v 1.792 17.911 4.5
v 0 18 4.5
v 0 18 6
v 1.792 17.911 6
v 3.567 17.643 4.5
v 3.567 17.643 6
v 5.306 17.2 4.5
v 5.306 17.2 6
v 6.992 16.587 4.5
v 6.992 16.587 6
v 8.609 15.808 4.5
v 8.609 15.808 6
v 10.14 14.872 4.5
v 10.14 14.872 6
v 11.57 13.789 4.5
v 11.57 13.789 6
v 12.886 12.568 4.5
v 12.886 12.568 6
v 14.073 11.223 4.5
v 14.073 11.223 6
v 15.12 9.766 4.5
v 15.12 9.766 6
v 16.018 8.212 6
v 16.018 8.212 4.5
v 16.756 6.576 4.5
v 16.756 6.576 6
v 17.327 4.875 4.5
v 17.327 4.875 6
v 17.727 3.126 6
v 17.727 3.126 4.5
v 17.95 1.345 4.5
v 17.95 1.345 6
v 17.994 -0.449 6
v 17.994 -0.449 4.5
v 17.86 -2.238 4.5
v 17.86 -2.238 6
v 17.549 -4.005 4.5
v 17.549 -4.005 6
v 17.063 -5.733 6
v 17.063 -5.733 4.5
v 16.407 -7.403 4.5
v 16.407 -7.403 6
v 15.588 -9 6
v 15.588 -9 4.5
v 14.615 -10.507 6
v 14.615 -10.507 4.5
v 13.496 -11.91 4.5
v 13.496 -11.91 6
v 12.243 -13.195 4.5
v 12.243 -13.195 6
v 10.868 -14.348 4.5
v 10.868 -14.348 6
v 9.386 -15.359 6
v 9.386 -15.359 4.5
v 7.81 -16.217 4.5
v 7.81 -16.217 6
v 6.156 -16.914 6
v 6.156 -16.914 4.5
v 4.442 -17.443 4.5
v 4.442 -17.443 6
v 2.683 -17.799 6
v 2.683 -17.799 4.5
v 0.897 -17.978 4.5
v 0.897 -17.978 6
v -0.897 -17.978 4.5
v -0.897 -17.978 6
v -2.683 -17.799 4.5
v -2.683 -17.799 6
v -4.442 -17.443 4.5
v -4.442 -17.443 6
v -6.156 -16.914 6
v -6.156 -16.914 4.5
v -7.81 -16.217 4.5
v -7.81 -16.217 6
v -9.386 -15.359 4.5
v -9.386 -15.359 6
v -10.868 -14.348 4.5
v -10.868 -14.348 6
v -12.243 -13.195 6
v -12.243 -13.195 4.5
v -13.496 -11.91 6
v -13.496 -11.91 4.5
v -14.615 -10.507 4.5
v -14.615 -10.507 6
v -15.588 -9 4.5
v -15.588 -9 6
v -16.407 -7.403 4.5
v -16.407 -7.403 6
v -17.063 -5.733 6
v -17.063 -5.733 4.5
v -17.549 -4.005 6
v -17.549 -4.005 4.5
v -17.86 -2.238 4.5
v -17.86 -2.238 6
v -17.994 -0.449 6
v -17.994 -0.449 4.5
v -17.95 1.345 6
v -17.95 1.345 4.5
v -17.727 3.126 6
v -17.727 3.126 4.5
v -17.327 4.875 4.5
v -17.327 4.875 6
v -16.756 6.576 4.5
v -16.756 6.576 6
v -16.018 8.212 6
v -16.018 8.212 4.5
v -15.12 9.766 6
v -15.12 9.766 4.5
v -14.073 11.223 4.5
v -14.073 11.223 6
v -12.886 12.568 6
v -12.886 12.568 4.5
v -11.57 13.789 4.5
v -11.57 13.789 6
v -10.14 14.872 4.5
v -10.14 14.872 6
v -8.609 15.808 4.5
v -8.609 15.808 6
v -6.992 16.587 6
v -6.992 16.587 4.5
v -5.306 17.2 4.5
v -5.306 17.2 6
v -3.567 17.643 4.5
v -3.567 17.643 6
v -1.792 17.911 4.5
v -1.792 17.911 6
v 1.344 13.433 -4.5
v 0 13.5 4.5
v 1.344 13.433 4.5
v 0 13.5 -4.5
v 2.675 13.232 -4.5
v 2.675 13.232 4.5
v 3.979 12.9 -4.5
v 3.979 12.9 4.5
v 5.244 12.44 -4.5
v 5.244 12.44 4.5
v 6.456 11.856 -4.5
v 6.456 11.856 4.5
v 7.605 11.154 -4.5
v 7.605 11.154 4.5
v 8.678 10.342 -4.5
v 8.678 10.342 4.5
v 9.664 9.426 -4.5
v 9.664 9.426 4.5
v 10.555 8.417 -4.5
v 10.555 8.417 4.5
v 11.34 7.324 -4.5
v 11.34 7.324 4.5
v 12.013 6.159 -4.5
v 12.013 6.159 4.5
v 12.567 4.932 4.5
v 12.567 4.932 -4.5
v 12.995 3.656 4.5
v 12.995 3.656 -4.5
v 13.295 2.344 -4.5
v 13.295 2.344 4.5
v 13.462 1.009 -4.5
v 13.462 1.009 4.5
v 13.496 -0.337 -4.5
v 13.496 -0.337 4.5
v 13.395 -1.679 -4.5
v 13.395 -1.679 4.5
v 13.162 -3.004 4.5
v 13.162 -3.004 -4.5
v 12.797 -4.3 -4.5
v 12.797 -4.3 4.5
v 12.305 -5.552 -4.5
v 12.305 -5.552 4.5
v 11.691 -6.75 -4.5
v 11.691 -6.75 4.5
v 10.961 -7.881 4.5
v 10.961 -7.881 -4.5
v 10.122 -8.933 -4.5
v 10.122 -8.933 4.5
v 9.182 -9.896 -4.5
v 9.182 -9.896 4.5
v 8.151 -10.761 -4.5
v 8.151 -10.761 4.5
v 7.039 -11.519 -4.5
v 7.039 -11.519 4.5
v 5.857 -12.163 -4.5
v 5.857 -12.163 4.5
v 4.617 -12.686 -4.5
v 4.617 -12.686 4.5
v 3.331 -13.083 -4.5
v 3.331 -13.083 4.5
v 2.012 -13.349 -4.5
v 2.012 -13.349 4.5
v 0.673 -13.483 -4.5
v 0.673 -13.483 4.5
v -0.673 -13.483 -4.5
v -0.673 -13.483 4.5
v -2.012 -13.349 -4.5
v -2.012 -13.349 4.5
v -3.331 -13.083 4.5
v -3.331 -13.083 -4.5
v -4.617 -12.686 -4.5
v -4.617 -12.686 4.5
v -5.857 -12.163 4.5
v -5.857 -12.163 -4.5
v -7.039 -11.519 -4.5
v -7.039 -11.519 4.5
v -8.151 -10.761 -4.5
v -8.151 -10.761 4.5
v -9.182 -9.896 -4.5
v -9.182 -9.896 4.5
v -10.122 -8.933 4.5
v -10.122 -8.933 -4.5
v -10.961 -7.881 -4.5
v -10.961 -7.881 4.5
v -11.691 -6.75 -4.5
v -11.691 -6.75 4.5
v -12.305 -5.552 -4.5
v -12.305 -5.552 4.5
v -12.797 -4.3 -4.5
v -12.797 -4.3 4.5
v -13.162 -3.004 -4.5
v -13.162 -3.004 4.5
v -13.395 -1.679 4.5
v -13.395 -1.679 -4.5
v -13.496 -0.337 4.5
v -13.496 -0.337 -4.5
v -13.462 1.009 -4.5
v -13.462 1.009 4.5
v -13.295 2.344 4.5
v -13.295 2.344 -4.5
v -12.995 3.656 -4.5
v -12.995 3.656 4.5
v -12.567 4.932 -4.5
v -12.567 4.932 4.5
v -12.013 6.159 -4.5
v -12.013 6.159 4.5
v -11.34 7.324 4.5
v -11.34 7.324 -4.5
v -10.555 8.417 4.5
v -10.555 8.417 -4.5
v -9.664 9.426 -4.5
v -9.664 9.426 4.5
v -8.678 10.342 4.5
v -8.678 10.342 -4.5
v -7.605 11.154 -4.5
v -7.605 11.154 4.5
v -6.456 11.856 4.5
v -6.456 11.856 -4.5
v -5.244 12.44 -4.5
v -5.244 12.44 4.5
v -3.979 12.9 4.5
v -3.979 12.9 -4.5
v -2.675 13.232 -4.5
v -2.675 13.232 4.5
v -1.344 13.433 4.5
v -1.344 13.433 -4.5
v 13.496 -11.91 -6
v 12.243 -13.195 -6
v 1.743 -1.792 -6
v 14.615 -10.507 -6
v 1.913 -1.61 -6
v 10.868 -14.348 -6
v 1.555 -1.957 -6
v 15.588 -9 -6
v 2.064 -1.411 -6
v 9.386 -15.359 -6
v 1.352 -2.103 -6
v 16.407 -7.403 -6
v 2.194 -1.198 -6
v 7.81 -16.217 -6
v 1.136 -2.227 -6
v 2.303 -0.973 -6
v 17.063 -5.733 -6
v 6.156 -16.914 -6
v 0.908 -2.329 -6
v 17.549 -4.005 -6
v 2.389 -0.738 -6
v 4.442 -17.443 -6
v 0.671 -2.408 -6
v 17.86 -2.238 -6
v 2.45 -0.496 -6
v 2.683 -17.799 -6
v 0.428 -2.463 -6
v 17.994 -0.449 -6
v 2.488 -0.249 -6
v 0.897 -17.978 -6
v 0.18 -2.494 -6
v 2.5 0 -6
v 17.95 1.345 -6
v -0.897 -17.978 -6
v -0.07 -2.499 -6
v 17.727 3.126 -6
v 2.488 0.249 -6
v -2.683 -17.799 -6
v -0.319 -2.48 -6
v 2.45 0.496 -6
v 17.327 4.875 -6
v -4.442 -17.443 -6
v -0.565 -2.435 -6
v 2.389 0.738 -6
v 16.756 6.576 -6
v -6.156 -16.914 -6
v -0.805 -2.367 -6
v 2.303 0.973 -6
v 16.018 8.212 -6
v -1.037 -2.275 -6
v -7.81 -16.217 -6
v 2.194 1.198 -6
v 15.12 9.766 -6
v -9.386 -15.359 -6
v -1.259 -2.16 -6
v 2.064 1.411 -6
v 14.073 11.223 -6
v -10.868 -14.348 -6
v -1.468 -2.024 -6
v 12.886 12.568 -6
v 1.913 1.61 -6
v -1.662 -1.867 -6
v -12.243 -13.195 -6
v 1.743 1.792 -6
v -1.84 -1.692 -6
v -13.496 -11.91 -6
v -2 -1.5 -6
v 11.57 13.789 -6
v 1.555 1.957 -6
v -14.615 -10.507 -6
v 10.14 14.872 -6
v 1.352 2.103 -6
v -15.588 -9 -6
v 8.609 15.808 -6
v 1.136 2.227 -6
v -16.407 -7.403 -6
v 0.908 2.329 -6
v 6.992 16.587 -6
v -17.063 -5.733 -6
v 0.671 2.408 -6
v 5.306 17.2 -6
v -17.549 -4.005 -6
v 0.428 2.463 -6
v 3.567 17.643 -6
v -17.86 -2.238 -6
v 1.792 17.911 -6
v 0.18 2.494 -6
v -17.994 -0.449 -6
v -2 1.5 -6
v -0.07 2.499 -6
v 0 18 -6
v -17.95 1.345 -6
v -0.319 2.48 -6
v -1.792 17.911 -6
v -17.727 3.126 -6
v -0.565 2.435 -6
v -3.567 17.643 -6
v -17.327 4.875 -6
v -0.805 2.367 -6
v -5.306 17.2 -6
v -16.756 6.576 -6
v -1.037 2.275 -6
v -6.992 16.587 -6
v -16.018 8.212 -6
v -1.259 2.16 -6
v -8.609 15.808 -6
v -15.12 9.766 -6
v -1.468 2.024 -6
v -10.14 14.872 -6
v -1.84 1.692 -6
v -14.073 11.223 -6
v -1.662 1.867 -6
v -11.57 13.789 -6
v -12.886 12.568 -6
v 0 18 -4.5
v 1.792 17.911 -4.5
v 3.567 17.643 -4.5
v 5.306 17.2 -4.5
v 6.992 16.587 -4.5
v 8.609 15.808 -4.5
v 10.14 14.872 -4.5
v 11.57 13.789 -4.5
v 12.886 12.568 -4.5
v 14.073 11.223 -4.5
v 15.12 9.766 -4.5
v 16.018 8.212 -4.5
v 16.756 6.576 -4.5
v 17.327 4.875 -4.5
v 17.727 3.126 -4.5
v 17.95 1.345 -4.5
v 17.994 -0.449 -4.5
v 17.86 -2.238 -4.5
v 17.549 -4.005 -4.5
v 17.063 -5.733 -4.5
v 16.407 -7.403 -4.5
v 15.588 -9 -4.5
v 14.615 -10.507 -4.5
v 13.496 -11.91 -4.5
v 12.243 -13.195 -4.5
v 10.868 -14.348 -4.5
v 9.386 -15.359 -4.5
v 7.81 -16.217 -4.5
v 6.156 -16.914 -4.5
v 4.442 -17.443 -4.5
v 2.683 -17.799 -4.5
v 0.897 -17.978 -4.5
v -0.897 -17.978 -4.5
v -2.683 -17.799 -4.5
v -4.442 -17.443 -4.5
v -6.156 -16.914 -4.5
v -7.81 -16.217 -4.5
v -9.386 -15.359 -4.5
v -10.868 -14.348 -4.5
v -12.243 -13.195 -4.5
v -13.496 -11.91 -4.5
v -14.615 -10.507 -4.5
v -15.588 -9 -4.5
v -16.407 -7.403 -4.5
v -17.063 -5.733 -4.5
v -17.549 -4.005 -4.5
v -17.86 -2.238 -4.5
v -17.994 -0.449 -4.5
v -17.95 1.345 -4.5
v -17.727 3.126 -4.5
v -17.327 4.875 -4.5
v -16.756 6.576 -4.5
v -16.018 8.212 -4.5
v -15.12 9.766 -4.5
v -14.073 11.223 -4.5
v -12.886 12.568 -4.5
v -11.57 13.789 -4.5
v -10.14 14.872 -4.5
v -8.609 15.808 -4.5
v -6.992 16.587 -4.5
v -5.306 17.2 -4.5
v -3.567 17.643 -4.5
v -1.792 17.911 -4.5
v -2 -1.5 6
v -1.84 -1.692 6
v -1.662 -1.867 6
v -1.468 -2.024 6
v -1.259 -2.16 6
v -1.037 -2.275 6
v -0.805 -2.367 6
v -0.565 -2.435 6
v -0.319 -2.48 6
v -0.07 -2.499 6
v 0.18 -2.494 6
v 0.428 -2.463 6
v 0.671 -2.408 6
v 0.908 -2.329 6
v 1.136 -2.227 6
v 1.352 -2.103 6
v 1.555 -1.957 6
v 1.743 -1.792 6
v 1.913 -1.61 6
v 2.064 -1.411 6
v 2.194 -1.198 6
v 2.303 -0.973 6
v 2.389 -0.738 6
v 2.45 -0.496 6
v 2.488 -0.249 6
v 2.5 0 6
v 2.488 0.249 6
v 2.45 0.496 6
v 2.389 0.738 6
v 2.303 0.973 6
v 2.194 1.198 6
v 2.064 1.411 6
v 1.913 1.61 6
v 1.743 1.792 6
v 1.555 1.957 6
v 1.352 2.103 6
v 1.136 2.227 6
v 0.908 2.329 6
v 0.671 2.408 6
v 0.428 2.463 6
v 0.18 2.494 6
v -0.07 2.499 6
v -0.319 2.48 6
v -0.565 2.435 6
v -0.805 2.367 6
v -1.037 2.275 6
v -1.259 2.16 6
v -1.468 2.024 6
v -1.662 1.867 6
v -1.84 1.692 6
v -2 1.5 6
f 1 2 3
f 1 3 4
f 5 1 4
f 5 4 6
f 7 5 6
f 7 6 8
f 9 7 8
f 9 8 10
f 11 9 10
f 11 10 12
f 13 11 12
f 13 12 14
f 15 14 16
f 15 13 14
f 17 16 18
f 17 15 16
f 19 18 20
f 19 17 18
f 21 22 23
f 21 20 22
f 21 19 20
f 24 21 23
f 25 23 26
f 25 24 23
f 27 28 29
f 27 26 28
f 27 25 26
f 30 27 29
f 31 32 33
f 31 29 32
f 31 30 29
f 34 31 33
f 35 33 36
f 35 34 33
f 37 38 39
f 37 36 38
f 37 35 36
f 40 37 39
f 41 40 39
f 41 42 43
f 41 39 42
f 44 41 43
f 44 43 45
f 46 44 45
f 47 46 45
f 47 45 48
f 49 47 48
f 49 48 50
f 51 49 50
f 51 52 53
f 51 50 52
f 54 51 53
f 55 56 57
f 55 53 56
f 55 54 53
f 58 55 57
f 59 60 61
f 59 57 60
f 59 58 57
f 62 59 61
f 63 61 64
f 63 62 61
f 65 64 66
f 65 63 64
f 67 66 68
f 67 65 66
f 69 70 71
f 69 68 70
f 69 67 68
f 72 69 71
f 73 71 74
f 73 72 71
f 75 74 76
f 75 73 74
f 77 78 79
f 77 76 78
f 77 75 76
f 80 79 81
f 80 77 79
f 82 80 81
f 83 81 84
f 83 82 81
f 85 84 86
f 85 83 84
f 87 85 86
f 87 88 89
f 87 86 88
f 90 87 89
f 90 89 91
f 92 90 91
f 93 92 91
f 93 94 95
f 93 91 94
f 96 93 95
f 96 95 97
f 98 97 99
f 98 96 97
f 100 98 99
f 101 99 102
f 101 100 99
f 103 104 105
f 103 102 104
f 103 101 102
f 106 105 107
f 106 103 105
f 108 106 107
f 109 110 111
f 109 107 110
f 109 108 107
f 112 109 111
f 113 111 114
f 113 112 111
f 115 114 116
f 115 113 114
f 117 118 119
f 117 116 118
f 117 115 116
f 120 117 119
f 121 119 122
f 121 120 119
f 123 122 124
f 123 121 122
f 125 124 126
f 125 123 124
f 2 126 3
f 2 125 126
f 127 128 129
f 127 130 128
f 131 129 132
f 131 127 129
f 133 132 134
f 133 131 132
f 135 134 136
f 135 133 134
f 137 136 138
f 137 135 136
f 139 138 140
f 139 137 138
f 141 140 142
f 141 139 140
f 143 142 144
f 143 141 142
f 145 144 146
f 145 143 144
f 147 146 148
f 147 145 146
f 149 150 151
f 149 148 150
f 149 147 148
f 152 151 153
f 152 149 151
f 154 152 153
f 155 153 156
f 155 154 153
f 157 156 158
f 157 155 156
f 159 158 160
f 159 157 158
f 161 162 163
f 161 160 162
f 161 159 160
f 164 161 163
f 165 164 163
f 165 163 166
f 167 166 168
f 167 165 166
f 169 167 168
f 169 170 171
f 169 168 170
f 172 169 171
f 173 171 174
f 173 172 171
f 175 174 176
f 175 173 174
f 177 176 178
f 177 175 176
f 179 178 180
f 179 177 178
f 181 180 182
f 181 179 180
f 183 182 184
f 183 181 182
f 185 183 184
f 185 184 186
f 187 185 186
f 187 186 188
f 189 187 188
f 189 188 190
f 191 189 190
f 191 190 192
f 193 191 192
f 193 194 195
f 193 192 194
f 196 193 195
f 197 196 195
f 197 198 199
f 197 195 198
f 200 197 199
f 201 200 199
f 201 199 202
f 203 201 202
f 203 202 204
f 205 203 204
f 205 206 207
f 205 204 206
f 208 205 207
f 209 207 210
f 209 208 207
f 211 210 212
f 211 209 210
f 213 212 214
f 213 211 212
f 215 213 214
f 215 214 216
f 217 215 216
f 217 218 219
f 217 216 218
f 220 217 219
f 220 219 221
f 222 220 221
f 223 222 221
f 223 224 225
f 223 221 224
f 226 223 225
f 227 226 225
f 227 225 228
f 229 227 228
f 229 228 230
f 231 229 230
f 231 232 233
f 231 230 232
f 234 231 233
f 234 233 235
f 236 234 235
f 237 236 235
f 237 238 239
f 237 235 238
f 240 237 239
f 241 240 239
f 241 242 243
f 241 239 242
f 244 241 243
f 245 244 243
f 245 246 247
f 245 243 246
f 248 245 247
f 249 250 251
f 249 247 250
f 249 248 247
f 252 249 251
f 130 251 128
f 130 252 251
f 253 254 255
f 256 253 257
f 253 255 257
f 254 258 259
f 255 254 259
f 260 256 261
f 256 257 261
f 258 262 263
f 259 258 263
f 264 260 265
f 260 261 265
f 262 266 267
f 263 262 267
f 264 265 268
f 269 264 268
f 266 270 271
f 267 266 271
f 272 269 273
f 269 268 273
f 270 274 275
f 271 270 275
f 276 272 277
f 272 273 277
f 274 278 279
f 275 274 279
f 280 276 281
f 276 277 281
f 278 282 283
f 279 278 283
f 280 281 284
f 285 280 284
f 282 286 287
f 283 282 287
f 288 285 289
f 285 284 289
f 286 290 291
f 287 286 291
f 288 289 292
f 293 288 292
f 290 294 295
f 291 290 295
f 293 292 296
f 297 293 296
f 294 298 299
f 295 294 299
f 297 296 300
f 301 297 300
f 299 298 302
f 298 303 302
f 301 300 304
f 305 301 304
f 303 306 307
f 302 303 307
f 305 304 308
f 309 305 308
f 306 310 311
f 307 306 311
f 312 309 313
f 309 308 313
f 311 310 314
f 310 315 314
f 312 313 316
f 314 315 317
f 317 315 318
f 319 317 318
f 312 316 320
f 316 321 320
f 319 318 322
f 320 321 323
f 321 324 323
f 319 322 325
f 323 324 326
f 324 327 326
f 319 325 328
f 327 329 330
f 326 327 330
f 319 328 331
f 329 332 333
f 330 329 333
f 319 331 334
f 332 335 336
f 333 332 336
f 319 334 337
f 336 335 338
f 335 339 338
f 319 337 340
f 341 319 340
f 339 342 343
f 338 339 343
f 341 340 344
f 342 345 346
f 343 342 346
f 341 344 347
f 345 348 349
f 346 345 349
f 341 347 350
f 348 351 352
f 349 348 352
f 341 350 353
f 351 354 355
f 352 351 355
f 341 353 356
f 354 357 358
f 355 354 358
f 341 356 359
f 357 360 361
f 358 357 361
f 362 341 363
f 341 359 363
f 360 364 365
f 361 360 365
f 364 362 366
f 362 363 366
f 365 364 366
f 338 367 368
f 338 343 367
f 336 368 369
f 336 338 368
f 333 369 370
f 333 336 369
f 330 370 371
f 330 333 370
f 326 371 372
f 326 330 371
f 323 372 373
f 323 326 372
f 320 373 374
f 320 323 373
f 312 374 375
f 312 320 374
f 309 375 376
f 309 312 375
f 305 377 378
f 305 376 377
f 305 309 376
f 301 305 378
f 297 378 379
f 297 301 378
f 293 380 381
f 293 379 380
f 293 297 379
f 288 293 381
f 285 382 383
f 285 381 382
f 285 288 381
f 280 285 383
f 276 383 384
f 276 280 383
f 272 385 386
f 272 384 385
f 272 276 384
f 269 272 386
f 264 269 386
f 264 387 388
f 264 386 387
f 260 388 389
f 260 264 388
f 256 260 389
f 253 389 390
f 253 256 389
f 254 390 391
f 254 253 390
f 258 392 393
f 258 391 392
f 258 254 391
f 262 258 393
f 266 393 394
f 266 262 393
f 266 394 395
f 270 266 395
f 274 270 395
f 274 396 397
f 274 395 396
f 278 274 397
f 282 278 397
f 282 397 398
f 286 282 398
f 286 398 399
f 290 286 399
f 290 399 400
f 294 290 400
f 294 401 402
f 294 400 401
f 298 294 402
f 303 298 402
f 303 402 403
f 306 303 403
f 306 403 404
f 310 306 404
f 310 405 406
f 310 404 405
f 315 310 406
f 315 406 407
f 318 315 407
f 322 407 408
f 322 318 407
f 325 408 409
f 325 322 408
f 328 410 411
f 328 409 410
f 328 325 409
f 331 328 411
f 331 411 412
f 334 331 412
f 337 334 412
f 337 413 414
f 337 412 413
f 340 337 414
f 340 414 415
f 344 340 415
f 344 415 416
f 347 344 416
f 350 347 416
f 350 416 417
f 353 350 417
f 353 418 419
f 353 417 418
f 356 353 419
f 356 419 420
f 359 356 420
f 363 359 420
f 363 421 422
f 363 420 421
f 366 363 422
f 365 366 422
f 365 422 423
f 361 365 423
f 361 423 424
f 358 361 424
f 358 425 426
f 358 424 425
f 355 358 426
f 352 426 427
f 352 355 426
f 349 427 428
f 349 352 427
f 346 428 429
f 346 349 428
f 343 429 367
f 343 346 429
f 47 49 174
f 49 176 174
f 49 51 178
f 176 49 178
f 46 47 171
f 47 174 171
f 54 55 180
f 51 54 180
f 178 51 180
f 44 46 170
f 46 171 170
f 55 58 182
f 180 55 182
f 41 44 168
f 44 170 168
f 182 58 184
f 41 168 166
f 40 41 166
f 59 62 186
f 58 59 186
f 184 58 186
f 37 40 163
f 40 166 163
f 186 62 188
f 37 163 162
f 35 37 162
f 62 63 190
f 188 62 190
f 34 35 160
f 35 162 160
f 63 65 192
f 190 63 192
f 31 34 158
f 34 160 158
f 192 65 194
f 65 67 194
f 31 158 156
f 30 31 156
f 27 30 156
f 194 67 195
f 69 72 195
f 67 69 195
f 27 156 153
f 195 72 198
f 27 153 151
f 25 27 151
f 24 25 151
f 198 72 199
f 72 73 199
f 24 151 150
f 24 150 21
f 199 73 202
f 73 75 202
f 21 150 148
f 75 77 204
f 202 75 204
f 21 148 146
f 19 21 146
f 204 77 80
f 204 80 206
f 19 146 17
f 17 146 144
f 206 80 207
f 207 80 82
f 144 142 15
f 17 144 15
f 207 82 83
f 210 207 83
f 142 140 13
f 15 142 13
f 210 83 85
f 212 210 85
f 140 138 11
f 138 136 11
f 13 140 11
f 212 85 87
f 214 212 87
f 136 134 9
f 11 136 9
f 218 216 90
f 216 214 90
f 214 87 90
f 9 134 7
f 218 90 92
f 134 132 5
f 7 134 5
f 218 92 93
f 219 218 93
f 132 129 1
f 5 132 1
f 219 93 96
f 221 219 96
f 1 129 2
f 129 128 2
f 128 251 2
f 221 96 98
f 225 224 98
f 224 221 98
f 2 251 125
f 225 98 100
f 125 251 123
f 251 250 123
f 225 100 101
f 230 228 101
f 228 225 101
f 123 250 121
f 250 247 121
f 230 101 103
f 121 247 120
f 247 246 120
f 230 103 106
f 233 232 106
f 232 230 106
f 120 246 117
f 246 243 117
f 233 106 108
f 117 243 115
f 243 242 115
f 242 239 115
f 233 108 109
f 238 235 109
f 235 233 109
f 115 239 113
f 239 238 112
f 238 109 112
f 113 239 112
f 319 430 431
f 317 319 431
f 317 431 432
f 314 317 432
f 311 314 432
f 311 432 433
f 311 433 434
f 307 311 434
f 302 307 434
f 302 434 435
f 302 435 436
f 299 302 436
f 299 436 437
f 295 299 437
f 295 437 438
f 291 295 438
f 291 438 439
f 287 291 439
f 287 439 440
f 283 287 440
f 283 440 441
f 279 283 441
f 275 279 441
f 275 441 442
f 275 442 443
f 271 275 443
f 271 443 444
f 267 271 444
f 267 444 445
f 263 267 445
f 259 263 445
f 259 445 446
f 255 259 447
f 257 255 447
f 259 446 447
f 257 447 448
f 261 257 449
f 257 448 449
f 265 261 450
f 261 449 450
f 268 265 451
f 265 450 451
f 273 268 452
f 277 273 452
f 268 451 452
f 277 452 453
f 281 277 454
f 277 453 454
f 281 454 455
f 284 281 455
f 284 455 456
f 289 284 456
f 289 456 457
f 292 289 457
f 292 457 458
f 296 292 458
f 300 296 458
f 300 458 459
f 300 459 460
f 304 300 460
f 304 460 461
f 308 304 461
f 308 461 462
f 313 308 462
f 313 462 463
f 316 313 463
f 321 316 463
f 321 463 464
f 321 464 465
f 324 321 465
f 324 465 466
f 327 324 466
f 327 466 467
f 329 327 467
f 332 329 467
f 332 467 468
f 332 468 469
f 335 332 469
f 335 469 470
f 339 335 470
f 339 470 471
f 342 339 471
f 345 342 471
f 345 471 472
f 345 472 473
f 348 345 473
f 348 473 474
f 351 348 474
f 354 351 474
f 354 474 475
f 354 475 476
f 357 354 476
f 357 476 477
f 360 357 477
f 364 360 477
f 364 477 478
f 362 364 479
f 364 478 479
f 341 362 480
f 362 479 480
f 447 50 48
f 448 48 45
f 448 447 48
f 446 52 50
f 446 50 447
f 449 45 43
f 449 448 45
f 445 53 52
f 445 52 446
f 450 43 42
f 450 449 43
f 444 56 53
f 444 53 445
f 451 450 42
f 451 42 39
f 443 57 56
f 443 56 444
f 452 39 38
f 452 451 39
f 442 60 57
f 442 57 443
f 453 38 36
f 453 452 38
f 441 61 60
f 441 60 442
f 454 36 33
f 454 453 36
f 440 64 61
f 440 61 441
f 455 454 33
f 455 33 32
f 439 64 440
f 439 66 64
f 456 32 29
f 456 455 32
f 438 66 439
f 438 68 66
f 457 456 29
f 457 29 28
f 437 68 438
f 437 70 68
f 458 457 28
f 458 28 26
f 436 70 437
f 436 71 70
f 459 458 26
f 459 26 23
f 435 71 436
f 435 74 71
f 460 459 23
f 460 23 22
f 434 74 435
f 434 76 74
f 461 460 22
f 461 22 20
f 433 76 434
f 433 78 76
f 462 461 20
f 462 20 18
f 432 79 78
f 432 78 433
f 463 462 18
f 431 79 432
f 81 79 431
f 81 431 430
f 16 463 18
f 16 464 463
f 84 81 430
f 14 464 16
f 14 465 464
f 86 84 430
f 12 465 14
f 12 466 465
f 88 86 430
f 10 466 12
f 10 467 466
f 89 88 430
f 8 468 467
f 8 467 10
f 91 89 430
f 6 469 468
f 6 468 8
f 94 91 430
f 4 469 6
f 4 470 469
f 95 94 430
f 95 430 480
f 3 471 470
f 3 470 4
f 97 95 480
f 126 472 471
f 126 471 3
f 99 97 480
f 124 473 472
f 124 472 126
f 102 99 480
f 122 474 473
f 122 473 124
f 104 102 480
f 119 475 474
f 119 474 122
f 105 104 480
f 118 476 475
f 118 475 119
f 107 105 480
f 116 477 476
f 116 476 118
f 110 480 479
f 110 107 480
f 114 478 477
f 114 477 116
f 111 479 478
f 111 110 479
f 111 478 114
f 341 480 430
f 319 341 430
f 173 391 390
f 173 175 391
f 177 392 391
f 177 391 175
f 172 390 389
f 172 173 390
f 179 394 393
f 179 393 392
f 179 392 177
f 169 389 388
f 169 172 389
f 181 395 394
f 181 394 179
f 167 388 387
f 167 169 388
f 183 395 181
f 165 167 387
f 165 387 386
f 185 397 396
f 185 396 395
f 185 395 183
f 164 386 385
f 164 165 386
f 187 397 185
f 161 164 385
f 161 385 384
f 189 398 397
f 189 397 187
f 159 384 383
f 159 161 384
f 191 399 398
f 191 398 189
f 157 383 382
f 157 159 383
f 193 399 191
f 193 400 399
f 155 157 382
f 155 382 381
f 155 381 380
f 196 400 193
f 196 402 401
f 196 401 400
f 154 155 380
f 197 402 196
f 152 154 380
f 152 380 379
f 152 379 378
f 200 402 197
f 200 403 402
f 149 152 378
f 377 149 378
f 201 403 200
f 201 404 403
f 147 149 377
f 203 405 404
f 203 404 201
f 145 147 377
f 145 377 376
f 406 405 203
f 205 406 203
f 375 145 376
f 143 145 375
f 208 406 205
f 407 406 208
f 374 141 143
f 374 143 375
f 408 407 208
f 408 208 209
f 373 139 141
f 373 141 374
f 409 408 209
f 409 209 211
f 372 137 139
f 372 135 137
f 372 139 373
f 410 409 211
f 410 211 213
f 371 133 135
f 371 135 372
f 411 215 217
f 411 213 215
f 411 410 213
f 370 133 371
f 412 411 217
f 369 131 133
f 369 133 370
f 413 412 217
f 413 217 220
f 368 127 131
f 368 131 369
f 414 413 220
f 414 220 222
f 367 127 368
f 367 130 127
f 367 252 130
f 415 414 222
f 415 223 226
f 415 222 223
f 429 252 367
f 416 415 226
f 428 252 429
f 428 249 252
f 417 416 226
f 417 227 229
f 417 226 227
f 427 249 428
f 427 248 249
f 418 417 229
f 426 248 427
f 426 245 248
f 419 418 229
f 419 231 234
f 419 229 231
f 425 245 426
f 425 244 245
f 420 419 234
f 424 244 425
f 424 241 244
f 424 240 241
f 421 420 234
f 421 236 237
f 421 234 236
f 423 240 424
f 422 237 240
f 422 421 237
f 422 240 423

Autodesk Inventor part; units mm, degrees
ref_plane "YZ Plane" through (0, 0, 0) normal (1, 0, 0) x (0, 1, 0)
ref_plane "XZ Plane" through (0, 0, 0) normal (0, 1, 0) x (-1, 0, 0)
ref_plane "XY Plane" through (0, 0, 0) normal (0, 0, 1) x (1, 0, 0)
sketch "Sketch2" plane through (0, 0, 0) normal (1, 0, 0) x (0, 1, 0)
  line L0 (0, 6) -> (18, 6)
  line L1 (18, 6) -> (18, 4.5)
  line L2 (18, 4.5) -> (13.5, 4.5)
  line L3 (13.5, 4.5) -> (13.5, -4.5)
  line L4 (13.5, -4.5) -> (18, -4.5)
  line L5 (18, -4.5) -> (18, -6)
  line L6 (18, -6) -> (0, -6)
  line L7 (0, -6) -> (0, 6)
  point P0 (0, 0)
  point P1 (18, -5.25)
  dimension "d0" = 18
  dimension "d1" = 4.5
  dimension "d2" = 18
  dimension "d3" = 12
  dimension "d4" = 6
  dimension "d5" = 1.5
revolve "Revolution1" add sketch "Sketch2" angle 360 about axis through (0, 0, -6) along (0, 0, 1)
sketch "Sketch3" plane through (0, 0, 6) normal (0, 0, 1) x (1, 0, 0)
  arc A0 (-2, -1.5) -> (-2, 1.5) centre (0, 0) ccw
  line L0 (-2, 1.5) -> (-2, -1.5)
  point P0 (0, 0)
  dimension "d14" = 5
  dimension "d15" = 3
extrude "Extrusion1" cut sketch "Sketch3" against normal through all
properties part number "Pulley"
